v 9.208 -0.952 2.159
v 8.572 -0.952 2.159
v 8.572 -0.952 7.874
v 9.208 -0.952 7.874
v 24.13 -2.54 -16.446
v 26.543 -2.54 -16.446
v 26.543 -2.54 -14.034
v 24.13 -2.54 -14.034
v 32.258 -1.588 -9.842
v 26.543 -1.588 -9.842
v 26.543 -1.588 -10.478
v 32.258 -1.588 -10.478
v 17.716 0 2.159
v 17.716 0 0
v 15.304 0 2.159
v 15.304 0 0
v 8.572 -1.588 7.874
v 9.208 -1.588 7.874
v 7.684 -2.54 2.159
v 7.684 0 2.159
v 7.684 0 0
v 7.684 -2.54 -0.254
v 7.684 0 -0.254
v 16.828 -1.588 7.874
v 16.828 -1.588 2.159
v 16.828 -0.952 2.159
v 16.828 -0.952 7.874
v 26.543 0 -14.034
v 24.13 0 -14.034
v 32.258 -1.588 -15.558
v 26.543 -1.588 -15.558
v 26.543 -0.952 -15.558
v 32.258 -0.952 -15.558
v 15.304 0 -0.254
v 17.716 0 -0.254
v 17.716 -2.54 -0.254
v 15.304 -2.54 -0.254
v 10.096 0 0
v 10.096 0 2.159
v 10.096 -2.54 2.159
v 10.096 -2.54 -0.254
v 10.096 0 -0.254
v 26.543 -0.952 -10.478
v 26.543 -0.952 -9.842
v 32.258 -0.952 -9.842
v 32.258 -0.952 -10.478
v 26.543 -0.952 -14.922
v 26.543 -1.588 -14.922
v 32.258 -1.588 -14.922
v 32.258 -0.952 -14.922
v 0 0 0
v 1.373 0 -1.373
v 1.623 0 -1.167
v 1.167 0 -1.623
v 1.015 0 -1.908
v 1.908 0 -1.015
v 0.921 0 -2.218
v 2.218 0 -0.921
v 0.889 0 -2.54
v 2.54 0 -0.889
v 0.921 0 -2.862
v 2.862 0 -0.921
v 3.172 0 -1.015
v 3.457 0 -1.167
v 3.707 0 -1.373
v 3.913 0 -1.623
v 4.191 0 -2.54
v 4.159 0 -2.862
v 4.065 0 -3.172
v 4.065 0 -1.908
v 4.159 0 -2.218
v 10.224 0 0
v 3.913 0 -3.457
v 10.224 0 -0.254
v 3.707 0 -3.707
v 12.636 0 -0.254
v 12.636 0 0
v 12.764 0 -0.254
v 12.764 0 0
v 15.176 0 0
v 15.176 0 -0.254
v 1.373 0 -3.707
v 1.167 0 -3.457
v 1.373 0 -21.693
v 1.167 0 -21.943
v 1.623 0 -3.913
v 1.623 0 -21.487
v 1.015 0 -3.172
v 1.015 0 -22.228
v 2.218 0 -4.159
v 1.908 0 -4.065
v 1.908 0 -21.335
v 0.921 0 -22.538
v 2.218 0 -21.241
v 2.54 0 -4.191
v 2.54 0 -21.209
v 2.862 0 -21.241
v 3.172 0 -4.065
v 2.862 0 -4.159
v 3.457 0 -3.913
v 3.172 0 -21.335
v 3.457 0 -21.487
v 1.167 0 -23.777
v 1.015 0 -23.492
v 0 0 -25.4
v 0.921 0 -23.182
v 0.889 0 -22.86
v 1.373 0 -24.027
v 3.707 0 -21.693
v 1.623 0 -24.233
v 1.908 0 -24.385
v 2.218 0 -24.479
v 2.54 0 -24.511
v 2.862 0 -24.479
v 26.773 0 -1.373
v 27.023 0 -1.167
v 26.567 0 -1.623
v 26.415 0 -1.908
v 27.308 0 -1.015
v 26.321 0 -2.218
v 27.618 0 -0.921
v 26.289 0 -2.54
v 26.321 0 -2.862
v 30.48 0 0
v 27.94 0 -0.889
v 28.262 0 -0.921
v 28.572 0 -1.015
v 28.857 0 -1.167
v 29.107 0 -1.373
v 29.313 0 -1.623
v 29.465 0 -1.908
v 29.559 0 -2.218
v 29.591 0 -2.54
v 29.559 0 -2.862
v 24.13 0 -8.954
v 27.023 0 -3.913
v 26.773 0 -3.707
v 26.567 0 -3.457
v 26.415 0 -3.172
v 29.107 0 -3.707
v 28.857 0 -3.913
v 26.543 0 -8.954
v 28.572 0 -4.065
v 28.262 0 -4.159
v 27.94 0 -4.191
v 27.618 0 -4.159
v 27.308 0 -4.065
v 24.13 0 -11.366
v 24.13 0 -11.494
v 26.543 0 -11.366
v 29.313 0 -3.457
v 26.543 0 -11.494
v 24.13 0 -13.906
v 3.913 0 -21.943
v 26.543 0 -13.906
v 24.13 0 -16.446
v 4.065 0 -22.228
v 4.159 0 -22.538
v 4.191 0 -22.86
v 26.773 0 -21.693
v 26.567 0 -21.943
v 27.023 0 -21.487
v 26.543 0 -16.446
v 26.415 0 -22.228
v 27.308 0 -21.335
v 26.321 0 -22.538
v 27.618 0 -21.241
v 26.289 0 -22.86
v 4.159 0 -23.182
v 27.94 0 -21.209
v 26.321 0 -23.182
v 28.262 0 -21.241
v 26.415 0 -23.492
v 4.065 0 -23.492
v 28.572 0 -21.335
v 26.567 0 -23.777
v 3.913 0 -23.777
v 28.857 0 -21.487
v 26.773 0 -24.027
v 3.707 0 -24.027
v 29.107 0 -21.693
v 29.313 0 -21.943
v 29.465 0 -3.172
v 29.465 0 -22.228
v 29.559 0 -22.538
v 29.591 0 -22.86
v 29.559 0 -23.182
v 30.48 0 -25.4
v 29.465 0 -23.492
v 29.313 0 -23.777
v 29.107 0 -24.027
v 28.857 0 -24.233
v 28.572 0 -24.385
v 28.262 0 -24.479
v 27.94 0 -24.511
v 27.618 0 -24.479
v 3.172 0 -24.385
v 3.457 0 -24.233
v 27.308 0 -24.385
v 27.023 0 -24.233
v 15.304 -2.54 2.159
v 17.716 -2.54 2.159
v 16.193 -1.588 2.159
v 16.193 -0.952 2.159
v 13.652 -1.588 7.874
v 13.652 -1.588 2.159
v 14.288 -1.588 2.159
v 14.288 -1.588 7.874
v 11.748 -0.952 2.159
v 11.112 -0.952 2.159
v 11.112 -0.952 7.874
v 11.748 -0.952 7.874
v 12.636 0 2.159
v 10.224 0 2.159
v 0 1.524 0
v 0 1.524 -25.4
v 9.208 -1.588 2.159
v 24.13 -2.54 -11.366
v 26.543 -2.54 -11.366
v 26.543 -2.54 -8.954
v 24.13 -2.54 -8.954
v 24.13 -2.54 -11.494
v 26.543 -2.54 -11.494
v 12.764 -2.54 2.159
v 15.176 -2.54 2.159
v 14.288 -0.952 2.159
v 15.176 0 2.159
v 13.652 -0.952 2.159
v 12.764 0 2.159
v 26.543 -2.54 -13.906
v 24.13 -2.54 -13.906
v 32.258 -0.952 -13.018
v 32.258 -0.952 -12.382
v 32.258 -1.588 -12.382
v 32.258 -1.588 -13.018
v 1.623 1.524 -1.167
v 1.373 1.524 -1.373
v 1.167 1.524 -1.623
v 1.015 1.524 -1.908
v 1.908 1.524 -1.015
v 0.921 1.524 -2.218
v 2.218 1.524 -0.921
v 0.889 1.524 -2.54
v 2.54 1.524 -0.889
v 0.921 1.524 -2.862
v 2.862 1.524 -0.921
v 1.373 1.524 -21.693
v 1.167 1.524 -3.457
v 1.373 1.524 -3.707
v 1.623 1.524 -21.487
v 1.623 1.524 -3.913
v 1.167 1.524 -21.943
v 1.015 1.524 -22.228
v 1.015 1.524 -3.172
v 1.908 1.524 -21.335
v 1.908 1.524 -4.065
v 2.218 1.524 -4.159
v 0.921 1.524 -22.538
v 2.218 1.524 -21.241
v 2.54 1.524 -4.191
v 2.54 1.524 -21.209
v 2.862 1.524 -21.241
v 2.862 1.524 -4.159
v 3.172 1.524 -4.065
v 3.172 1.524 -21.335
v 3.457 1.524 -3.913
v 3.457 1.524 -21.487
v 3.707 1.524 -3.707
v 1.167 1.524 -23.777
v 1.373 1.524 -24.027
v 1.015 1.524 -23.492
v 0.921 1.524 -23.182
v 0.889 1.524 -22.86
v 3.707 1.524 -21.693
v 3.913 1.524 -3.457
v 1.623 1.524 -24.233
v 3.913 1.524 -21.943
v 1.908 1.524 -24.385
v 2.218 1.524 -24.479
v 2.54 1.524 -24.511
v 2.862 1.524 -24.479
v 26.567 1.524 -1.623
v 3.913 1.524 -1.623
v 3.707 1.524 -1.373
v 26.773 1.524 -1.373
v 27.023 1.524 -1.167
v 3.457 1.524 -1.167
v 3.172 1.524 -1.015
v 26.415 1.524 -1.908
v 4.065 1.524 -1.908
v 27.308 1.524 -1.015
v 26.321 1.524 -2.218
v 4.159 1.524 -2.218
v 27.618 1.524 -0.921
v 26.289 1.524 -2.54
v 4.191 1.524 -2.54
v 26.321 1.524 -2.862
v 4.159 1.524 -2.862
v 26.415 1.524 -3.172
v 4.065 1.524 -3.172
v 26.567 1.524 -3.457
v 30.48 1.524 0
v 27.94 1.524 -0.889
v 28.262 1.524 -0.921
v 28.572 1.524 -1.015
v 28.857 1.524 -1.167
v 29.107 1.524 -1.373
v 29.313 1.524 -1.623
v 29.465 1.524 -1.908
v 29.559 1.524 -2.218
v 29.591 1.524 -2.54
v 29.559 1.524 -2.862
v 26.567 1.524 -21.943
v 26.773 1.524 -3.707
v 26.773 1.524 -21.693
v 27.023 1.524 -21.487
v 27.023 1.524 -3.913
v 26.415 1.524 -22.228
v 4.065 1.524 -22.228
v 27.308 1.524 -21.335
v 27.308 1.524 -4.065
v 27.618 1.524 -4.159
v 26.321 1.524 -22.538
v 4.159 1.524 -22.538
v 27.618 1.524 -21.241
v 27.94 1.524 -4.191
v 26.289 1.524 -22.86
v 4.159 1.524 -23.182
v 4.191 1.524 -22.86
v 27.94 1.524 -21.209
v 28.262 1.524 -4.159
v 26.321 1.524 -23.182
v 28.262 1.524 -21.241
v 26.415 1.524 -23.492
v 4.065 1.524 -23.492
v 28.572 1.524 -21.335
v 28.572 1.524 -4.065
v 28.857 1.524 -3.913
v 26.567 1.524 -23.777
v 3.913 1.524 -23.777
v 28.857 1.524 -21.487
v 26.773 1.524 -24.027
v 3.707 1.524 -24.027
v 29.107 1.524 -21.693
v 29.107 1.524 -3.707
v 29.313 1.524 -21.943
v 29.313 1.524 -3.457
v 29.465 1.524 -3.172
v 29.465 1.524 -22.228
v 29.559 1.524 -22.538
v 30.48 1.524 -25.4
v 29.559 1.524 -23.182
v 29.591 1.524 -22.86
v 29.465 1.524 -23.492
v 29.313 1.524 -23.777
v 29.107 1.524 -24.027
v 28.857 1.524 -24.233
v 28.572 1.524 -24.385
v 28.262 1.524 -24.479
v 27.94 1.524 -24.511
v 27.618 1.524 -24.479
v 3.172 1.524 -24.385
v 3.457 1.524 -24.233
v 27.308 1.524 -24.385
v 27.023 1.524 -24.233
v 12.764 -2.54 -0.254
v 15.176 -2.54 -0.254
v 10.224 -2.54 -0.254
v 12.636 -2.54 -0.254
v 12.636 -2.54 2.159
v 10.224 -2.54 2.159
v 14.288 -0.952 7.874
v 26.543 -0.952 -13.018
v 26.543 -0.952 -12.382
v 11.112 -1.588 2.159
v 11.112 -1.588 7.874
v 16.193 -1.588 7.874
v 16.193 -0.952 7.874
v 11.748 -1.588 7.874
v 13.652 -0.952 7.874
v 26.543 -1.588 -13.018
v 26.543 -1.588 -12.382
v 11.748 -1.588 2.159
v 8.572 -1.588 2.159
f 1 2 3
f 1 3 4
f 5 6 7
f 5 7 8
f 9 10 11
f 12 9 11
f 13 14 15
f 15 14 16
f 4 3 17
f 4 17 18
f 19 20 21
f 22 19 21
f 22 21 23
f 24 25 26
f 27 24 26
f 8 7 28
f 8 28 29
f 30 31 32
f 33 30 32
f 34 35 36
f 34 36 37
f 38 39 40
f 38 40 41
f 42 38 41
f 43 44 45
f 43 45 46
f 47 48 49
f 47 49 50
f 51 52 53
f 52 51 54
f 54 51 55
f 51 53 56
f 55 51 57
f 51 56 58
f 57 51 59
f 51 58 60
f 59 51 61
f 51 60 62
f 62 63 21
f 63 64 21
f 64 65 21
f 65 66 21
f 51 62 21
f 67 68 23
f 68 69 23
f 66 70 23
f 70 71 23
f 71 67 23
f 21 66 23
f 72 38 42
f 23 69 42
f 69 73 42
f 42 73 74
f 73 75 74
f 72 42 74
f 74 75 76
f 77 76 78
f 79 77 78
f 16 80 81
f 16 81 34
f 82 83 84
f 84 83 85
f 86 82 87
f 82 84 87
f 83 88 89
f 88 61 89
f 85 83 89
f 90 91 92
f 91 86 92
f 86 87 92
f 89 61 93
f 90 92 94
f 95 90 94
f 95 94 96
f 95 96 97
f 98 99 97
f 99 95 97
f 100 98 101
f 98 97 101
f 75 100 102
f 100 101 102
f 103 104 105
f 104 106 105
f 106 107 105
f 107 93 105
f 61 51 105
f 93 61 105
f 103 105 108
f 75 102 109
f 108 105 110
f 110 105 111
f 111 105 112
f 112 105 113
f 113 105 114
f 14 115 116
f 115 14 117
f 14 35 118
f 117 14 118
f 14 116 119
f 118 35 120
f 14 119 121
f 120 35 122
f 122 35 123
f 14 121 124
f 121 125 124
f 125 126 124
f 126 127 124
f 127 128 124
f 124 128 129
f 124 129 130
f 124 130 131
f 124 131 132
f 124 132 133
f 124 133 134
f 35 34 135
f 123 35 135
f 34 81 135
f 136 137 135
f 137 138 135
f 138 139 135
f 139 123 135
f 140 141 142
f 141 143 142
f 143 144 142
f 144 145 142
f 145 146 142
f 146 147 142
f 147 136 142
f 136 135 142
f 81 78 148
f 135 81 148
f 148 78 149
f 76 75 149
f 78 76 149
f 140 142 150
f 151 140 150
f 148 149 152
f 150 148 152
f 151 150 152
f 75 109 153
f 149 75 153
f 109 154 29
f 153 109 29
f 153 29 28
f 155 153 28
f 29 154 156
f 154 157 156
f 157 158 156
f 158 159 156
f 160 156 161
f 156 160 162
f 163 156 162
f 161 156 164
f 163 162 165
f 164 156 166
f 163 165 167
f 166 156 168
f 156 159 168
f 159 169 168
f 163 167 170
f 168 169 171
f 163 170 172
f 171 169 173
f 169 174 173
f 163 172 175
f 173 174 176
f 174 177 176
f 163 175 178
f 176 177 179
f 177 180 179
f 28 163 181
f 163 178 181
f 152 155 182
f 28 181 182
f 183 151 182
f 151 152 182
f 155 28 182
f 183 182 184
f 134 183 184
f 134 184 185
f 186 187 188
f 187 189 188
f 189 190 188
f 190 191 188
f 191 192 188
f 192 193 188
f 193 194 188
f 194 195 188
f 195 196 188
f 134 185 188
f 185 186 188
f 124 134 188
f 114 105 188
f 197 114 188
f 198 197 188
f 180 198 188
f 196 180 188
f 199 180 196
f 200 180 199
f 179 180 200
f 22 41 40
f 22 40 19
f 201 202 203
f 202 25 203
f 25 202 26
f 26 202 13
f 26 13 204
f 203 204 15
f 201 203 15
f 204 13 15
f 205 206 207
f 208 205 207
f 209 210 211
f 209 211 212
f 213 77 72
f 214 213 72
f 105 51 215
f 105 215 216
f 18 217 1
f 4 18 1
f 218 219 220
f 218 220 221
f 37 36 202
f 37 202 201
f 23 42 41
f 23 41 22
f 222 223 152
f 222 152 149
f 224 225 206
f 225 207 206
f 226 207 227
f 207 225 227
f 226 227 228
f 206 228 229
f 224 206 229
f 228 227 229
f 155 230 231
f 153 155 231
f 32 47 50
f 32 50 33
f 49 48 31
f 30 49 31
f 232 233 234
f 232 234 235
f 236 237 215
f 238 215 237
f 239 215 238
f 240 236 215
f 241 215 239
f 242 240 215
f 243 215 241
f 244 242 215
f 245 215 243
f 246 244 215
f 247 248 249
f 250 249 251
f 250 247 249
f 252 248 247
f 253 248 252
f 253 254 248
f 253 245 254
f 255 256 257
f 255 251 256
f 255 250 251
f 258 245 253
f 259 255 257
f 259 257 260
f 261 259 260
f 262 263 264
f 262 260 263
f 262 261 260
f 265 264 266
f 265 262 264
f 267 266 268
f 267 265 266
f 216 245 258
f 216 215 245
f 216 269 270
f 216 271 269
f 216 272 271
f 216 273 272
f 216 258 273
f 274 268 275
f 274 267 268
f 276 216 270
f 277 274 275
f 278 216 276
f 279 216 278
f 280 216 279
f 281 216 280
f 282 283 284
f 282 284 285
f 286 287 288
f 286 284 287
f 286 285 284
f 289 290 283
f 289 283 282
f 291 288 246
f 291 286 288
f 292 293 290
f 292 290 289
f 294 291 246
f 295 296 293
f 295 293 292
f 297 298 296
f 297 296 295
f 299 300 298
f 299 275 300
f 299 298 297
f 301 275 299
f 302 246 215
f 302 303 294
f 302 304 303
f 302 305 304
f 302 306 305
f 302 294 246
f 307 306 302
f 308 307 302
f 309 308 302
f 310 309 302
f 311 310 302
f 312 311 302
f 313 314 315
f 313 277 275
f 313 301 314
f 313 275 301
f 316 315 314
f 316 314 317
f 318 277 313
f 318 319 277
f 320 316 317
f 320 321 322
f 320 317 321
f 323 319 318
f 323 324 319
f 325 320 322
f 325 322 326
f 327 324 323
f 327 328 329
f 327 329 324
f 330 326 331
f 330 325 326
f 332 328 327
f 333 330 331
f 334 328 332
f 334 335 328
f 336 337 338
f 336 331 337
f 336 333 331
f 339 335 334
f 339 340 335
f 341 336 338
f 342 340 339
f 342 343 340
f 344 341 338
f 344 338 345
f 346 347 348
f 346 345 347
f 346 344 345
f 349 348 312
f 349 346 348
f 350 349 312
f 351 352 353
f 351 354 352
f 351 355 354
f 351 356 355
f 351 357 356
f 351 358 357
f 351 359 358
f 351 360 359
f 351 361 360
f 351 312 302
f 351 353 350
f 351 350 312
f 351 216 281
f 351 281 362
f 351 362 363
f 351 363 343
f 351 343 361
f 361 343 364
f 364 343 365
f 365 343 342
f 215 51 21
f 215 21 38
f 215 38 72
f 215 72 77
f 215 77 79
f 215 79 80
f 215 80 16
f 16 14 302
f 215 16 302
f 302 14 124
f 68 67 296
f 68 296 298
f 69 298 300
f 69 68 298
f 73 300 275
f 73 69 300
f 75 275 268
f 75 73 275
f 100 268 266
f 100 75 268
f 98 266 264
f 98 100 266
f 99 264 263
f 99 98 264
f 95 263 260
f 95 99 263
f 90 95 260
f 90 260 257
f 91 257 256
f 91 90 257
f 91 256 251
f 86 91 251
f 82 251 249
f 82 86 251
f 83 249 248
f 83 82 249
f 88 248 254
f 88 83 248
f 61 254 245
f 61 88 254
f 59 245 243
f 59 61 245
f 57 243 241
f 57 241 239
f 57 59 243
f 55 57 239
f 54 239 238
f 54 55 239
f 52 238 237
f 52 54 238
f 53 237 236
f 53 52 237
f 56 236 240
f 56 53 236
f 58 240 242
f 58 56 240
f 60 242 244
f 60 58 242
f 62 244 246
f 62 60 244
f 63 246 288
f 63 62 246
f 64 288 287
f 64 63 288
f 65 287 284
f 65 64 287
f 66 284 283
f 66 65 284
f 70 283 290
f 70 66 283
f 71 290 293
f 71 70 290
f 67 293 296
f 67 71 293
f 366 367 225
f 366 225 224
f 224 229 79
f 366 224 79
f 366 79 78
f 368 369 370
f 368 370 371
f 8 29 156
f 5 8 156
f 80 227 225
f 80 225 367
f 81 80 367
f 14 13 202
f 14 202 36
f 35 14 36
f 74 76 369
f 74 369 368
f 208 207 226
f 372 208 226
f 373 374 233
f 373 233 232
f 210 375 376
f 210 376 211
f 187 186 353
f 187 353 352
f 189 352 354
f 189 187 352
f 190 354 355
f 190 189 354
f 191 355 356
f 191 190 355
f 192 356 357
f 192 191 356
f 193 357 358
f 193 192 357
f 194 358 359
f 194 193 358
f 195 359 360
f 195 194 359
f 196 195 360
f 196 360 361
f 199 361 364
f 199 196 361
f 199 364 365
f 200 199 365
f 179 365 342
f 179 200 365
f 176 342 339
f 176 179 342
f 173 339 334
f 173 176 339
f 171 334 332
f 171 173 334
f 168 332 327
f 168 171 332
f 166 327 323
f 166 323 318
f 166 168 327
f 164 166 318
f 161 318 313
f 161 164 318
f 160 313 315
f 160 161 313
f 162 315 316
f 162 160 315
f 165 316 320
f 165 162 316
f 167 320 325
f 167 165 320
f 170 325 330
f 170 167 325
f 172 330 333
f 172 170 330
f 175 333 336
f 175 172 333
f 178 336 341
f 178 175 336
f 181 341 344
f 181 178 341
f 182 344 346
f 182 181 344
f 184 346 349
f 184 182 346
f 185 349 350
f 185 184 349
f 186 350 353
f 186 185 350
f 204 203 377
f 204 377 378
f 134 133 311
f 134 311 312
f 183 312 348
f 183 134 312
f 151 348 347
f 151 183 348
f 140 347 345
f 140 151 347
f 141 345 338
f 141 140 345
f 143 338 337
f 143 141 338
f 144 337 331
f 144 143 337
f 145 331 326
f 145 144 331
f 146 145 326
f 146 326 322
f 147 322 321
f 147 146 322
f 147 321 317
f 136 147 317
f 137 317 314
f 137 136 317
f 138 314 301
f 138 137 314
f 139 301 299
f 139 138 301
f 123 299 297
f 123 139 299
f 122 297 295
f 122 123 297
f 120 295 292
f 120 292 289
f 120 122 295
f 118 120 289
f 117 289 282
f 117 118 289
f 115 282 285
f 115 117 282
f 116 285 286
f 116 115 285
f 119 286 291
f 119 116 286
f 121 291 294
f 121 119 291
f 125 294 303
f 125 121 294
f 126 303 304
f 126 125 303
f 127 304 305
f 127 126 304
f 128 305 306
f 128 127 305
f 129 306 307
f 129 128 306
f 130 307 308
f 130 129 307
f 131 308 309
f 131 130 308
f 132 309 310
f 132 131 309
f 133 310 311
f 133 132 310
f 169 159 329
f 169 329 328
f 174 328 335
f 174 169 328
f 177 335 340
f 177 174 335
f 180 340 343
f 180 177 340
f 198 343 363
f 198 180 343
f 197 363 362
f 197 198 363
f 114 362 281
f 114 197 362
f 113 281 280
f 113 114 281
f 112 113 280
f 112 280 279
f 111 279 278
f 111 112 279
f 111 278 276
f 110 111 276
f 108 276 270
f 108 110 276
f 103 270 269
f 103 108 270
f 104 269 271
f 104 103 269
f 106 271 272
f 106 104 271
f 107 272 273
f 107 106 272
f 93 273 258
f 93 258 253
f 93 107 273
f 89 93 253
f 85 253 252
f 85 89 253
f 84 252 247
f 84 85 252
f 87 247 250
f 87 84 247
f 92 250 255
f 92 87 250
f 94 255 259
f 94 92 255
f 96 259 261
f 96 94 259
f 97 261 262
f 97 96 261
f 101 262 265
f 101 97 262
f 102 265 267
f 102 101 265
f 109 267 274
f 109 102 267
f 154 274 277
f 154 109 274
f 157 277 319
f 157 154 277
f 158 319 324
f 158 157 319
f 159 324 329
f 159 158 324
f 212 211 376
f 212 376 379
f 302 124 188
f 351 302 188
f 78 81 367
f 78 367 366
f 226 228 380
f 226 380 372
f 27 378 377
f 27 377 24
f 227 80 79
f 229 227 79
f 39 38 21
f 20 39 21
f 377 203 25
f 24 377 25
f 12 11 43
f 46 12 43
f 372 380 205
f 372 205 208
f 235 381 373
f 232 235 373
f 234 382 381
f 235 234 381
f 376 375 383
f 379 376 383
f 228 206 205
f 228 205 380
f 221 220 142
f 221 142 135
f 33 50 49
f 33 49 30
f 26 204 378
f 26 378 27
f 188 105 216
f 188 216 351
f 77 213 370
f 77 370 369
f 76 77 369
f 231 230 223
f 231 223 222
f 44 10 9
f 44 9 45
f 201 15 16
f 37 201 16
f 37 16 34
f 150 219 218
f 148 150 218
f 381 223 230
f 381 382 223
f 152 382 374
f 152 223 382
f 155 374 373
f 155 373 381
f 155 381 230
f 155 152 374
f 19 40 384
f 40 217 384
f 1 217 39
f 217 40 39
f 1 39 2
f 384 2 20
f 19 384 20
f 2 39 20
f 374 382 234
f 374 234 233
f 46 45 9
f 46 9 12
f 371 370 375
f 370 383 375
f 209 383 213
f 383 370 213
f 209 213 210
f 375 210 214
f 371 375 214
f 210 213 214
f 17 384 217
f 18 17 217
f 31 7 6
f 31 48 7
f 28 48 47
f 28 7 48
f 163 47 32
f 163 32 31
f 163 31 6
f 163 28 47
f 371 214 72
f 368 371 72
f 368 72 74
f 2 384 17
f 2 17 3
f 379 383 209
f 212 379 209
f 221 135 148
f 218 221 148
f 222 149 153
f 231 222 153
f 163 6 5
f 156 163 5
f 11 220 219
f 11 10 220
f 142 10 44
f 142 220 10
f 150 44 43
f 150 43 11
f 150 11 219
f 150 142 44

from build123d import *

# Parameters (mm, degrees)
SKETCH1_W           = 30.48
SKETCH1_H           = 25.4
SKETCH1_R           = 1.651
BOSS_EXTRUDE1_DEPTH = 1.524
SKETCH3_W           = 2.413
SKETCH3_H           = 2.413
BOSS_EXTRUDE2_DEPTH = 2.54
SKETCH4_W           = 0.635
SKETCH4_H           = 0.635
BOSS_EXTRUDE3_DEPTH = 5.715
SKETCH5_W           = 0.635
SKETCH5_H           = 0.635
BOSS_EXTRUDE4_DEPTH = 5.715


with BuildPart() as part:
    # Sketch1 → Boss-Extrude1 (new body)
    with BuildSketch(Plane(origin=(0, 0, 0), x_dir=(1, 0, 0), z_dir=(0, 1, 0))):
        with Locations((15.24, 12.7)):
            Rectangle(SKETCH1_W, SKETCH1_H)
        with Locations((2.54, 22.86)):
            Circle(SKETCH1_R, mode=Mode.SUBTRACT)
        with Locations((27.94, 22.86)):
            Circle(SKETCH1_R, mode=Mode.SUBTRACT)
        with Locations((27.94, 2.54)):
            Circle(SKETCH1_R, mode=Mode.SUBTRACT)
        with Locations((2.54, 2.54)):
            Circle(SKETCH1_R, mode=Mode.SUBTRACT)
    extrude(amount=BOSS_EXTRUDE1_DEPTH)

    # Sketch3 → Boss-Extrude2 (add)
    with BuildSketch(Plane(origin=(0, 0, 0), x_dir=(-1, 0, 0), z_dir=(0, -1, 0))):
        with Locations((-25.3365, 10.16)):
            Rectangle(SKETCH3_W, SKETCH3_H)
        with Locations((-25.3365, 12.7)):
            Rectangle(SKETCH3_W, SKETCH3_H)
        with Locations((-25.3365, 15.24)):
            Rectangle(SKETCH3_W, SKETCH3_H)
        with Locations((-16.51, -0.9525)):
            Rectangle(SKETCH3_W, SKETCH3_H)
        with Locations((-13.97, -0.9525)):
            Rectangle(SKETCH3_W, SKETCH3_H)
        with Locations((-11.43, -0.9525)):
            Rectangle(SKETCH3_W, SKETCH3_H)
        with Locations((-8.89, -0.9525)):
            Rectangle(SKETCH3_W, SKETCH3_H)
    extrude(amount=BOSS_EXTRUDE2_DEPTH)

    # Sketch4 → Boss-Extrude3 (add)
    with BuildSketch(Plane.XY.offset(2.159)):
        with Locations((8.89, -1.27)):
            Rectangle(SKETCH4_W, SKETCH4_H)
        with Locations((11.43, -1.27)):
            Rectangle(SKETCH4_W, SKETCH4_H)
        with Locations((13.97, -1.27)):
            Rectangle(SKETCH4_W, SKETCH4_H)
        with Locations((16.51, -1.27)):
            Rectangle(SKETCH4_W, SKETCH4_H)
    extrude(amount=BOSS_EXTRUDE3_DEPTH)

    # Sketch5 → Boss-Extrude4 (add)
    with BuildSketch(Plane(origin=(26.543, 0, 0), x_dir=(0, 0, -1), z_dir=(1, 0, 0))):
        with Locations((10.16, -1.27)):
            Rectangle(SKETCH5_W, SKETCH5_H)
        with Locations((12.7, -1.27)):
            Rectangle(SKETCH5_W, SKETCH5_H)
        with Locations((15.24, -1.27)):
            Rectangle(SKETCH5_W, SKETCH5_H)
    extrude(amount=BOSS_EXTRUDE4_DEPTH)


solid = part.part
